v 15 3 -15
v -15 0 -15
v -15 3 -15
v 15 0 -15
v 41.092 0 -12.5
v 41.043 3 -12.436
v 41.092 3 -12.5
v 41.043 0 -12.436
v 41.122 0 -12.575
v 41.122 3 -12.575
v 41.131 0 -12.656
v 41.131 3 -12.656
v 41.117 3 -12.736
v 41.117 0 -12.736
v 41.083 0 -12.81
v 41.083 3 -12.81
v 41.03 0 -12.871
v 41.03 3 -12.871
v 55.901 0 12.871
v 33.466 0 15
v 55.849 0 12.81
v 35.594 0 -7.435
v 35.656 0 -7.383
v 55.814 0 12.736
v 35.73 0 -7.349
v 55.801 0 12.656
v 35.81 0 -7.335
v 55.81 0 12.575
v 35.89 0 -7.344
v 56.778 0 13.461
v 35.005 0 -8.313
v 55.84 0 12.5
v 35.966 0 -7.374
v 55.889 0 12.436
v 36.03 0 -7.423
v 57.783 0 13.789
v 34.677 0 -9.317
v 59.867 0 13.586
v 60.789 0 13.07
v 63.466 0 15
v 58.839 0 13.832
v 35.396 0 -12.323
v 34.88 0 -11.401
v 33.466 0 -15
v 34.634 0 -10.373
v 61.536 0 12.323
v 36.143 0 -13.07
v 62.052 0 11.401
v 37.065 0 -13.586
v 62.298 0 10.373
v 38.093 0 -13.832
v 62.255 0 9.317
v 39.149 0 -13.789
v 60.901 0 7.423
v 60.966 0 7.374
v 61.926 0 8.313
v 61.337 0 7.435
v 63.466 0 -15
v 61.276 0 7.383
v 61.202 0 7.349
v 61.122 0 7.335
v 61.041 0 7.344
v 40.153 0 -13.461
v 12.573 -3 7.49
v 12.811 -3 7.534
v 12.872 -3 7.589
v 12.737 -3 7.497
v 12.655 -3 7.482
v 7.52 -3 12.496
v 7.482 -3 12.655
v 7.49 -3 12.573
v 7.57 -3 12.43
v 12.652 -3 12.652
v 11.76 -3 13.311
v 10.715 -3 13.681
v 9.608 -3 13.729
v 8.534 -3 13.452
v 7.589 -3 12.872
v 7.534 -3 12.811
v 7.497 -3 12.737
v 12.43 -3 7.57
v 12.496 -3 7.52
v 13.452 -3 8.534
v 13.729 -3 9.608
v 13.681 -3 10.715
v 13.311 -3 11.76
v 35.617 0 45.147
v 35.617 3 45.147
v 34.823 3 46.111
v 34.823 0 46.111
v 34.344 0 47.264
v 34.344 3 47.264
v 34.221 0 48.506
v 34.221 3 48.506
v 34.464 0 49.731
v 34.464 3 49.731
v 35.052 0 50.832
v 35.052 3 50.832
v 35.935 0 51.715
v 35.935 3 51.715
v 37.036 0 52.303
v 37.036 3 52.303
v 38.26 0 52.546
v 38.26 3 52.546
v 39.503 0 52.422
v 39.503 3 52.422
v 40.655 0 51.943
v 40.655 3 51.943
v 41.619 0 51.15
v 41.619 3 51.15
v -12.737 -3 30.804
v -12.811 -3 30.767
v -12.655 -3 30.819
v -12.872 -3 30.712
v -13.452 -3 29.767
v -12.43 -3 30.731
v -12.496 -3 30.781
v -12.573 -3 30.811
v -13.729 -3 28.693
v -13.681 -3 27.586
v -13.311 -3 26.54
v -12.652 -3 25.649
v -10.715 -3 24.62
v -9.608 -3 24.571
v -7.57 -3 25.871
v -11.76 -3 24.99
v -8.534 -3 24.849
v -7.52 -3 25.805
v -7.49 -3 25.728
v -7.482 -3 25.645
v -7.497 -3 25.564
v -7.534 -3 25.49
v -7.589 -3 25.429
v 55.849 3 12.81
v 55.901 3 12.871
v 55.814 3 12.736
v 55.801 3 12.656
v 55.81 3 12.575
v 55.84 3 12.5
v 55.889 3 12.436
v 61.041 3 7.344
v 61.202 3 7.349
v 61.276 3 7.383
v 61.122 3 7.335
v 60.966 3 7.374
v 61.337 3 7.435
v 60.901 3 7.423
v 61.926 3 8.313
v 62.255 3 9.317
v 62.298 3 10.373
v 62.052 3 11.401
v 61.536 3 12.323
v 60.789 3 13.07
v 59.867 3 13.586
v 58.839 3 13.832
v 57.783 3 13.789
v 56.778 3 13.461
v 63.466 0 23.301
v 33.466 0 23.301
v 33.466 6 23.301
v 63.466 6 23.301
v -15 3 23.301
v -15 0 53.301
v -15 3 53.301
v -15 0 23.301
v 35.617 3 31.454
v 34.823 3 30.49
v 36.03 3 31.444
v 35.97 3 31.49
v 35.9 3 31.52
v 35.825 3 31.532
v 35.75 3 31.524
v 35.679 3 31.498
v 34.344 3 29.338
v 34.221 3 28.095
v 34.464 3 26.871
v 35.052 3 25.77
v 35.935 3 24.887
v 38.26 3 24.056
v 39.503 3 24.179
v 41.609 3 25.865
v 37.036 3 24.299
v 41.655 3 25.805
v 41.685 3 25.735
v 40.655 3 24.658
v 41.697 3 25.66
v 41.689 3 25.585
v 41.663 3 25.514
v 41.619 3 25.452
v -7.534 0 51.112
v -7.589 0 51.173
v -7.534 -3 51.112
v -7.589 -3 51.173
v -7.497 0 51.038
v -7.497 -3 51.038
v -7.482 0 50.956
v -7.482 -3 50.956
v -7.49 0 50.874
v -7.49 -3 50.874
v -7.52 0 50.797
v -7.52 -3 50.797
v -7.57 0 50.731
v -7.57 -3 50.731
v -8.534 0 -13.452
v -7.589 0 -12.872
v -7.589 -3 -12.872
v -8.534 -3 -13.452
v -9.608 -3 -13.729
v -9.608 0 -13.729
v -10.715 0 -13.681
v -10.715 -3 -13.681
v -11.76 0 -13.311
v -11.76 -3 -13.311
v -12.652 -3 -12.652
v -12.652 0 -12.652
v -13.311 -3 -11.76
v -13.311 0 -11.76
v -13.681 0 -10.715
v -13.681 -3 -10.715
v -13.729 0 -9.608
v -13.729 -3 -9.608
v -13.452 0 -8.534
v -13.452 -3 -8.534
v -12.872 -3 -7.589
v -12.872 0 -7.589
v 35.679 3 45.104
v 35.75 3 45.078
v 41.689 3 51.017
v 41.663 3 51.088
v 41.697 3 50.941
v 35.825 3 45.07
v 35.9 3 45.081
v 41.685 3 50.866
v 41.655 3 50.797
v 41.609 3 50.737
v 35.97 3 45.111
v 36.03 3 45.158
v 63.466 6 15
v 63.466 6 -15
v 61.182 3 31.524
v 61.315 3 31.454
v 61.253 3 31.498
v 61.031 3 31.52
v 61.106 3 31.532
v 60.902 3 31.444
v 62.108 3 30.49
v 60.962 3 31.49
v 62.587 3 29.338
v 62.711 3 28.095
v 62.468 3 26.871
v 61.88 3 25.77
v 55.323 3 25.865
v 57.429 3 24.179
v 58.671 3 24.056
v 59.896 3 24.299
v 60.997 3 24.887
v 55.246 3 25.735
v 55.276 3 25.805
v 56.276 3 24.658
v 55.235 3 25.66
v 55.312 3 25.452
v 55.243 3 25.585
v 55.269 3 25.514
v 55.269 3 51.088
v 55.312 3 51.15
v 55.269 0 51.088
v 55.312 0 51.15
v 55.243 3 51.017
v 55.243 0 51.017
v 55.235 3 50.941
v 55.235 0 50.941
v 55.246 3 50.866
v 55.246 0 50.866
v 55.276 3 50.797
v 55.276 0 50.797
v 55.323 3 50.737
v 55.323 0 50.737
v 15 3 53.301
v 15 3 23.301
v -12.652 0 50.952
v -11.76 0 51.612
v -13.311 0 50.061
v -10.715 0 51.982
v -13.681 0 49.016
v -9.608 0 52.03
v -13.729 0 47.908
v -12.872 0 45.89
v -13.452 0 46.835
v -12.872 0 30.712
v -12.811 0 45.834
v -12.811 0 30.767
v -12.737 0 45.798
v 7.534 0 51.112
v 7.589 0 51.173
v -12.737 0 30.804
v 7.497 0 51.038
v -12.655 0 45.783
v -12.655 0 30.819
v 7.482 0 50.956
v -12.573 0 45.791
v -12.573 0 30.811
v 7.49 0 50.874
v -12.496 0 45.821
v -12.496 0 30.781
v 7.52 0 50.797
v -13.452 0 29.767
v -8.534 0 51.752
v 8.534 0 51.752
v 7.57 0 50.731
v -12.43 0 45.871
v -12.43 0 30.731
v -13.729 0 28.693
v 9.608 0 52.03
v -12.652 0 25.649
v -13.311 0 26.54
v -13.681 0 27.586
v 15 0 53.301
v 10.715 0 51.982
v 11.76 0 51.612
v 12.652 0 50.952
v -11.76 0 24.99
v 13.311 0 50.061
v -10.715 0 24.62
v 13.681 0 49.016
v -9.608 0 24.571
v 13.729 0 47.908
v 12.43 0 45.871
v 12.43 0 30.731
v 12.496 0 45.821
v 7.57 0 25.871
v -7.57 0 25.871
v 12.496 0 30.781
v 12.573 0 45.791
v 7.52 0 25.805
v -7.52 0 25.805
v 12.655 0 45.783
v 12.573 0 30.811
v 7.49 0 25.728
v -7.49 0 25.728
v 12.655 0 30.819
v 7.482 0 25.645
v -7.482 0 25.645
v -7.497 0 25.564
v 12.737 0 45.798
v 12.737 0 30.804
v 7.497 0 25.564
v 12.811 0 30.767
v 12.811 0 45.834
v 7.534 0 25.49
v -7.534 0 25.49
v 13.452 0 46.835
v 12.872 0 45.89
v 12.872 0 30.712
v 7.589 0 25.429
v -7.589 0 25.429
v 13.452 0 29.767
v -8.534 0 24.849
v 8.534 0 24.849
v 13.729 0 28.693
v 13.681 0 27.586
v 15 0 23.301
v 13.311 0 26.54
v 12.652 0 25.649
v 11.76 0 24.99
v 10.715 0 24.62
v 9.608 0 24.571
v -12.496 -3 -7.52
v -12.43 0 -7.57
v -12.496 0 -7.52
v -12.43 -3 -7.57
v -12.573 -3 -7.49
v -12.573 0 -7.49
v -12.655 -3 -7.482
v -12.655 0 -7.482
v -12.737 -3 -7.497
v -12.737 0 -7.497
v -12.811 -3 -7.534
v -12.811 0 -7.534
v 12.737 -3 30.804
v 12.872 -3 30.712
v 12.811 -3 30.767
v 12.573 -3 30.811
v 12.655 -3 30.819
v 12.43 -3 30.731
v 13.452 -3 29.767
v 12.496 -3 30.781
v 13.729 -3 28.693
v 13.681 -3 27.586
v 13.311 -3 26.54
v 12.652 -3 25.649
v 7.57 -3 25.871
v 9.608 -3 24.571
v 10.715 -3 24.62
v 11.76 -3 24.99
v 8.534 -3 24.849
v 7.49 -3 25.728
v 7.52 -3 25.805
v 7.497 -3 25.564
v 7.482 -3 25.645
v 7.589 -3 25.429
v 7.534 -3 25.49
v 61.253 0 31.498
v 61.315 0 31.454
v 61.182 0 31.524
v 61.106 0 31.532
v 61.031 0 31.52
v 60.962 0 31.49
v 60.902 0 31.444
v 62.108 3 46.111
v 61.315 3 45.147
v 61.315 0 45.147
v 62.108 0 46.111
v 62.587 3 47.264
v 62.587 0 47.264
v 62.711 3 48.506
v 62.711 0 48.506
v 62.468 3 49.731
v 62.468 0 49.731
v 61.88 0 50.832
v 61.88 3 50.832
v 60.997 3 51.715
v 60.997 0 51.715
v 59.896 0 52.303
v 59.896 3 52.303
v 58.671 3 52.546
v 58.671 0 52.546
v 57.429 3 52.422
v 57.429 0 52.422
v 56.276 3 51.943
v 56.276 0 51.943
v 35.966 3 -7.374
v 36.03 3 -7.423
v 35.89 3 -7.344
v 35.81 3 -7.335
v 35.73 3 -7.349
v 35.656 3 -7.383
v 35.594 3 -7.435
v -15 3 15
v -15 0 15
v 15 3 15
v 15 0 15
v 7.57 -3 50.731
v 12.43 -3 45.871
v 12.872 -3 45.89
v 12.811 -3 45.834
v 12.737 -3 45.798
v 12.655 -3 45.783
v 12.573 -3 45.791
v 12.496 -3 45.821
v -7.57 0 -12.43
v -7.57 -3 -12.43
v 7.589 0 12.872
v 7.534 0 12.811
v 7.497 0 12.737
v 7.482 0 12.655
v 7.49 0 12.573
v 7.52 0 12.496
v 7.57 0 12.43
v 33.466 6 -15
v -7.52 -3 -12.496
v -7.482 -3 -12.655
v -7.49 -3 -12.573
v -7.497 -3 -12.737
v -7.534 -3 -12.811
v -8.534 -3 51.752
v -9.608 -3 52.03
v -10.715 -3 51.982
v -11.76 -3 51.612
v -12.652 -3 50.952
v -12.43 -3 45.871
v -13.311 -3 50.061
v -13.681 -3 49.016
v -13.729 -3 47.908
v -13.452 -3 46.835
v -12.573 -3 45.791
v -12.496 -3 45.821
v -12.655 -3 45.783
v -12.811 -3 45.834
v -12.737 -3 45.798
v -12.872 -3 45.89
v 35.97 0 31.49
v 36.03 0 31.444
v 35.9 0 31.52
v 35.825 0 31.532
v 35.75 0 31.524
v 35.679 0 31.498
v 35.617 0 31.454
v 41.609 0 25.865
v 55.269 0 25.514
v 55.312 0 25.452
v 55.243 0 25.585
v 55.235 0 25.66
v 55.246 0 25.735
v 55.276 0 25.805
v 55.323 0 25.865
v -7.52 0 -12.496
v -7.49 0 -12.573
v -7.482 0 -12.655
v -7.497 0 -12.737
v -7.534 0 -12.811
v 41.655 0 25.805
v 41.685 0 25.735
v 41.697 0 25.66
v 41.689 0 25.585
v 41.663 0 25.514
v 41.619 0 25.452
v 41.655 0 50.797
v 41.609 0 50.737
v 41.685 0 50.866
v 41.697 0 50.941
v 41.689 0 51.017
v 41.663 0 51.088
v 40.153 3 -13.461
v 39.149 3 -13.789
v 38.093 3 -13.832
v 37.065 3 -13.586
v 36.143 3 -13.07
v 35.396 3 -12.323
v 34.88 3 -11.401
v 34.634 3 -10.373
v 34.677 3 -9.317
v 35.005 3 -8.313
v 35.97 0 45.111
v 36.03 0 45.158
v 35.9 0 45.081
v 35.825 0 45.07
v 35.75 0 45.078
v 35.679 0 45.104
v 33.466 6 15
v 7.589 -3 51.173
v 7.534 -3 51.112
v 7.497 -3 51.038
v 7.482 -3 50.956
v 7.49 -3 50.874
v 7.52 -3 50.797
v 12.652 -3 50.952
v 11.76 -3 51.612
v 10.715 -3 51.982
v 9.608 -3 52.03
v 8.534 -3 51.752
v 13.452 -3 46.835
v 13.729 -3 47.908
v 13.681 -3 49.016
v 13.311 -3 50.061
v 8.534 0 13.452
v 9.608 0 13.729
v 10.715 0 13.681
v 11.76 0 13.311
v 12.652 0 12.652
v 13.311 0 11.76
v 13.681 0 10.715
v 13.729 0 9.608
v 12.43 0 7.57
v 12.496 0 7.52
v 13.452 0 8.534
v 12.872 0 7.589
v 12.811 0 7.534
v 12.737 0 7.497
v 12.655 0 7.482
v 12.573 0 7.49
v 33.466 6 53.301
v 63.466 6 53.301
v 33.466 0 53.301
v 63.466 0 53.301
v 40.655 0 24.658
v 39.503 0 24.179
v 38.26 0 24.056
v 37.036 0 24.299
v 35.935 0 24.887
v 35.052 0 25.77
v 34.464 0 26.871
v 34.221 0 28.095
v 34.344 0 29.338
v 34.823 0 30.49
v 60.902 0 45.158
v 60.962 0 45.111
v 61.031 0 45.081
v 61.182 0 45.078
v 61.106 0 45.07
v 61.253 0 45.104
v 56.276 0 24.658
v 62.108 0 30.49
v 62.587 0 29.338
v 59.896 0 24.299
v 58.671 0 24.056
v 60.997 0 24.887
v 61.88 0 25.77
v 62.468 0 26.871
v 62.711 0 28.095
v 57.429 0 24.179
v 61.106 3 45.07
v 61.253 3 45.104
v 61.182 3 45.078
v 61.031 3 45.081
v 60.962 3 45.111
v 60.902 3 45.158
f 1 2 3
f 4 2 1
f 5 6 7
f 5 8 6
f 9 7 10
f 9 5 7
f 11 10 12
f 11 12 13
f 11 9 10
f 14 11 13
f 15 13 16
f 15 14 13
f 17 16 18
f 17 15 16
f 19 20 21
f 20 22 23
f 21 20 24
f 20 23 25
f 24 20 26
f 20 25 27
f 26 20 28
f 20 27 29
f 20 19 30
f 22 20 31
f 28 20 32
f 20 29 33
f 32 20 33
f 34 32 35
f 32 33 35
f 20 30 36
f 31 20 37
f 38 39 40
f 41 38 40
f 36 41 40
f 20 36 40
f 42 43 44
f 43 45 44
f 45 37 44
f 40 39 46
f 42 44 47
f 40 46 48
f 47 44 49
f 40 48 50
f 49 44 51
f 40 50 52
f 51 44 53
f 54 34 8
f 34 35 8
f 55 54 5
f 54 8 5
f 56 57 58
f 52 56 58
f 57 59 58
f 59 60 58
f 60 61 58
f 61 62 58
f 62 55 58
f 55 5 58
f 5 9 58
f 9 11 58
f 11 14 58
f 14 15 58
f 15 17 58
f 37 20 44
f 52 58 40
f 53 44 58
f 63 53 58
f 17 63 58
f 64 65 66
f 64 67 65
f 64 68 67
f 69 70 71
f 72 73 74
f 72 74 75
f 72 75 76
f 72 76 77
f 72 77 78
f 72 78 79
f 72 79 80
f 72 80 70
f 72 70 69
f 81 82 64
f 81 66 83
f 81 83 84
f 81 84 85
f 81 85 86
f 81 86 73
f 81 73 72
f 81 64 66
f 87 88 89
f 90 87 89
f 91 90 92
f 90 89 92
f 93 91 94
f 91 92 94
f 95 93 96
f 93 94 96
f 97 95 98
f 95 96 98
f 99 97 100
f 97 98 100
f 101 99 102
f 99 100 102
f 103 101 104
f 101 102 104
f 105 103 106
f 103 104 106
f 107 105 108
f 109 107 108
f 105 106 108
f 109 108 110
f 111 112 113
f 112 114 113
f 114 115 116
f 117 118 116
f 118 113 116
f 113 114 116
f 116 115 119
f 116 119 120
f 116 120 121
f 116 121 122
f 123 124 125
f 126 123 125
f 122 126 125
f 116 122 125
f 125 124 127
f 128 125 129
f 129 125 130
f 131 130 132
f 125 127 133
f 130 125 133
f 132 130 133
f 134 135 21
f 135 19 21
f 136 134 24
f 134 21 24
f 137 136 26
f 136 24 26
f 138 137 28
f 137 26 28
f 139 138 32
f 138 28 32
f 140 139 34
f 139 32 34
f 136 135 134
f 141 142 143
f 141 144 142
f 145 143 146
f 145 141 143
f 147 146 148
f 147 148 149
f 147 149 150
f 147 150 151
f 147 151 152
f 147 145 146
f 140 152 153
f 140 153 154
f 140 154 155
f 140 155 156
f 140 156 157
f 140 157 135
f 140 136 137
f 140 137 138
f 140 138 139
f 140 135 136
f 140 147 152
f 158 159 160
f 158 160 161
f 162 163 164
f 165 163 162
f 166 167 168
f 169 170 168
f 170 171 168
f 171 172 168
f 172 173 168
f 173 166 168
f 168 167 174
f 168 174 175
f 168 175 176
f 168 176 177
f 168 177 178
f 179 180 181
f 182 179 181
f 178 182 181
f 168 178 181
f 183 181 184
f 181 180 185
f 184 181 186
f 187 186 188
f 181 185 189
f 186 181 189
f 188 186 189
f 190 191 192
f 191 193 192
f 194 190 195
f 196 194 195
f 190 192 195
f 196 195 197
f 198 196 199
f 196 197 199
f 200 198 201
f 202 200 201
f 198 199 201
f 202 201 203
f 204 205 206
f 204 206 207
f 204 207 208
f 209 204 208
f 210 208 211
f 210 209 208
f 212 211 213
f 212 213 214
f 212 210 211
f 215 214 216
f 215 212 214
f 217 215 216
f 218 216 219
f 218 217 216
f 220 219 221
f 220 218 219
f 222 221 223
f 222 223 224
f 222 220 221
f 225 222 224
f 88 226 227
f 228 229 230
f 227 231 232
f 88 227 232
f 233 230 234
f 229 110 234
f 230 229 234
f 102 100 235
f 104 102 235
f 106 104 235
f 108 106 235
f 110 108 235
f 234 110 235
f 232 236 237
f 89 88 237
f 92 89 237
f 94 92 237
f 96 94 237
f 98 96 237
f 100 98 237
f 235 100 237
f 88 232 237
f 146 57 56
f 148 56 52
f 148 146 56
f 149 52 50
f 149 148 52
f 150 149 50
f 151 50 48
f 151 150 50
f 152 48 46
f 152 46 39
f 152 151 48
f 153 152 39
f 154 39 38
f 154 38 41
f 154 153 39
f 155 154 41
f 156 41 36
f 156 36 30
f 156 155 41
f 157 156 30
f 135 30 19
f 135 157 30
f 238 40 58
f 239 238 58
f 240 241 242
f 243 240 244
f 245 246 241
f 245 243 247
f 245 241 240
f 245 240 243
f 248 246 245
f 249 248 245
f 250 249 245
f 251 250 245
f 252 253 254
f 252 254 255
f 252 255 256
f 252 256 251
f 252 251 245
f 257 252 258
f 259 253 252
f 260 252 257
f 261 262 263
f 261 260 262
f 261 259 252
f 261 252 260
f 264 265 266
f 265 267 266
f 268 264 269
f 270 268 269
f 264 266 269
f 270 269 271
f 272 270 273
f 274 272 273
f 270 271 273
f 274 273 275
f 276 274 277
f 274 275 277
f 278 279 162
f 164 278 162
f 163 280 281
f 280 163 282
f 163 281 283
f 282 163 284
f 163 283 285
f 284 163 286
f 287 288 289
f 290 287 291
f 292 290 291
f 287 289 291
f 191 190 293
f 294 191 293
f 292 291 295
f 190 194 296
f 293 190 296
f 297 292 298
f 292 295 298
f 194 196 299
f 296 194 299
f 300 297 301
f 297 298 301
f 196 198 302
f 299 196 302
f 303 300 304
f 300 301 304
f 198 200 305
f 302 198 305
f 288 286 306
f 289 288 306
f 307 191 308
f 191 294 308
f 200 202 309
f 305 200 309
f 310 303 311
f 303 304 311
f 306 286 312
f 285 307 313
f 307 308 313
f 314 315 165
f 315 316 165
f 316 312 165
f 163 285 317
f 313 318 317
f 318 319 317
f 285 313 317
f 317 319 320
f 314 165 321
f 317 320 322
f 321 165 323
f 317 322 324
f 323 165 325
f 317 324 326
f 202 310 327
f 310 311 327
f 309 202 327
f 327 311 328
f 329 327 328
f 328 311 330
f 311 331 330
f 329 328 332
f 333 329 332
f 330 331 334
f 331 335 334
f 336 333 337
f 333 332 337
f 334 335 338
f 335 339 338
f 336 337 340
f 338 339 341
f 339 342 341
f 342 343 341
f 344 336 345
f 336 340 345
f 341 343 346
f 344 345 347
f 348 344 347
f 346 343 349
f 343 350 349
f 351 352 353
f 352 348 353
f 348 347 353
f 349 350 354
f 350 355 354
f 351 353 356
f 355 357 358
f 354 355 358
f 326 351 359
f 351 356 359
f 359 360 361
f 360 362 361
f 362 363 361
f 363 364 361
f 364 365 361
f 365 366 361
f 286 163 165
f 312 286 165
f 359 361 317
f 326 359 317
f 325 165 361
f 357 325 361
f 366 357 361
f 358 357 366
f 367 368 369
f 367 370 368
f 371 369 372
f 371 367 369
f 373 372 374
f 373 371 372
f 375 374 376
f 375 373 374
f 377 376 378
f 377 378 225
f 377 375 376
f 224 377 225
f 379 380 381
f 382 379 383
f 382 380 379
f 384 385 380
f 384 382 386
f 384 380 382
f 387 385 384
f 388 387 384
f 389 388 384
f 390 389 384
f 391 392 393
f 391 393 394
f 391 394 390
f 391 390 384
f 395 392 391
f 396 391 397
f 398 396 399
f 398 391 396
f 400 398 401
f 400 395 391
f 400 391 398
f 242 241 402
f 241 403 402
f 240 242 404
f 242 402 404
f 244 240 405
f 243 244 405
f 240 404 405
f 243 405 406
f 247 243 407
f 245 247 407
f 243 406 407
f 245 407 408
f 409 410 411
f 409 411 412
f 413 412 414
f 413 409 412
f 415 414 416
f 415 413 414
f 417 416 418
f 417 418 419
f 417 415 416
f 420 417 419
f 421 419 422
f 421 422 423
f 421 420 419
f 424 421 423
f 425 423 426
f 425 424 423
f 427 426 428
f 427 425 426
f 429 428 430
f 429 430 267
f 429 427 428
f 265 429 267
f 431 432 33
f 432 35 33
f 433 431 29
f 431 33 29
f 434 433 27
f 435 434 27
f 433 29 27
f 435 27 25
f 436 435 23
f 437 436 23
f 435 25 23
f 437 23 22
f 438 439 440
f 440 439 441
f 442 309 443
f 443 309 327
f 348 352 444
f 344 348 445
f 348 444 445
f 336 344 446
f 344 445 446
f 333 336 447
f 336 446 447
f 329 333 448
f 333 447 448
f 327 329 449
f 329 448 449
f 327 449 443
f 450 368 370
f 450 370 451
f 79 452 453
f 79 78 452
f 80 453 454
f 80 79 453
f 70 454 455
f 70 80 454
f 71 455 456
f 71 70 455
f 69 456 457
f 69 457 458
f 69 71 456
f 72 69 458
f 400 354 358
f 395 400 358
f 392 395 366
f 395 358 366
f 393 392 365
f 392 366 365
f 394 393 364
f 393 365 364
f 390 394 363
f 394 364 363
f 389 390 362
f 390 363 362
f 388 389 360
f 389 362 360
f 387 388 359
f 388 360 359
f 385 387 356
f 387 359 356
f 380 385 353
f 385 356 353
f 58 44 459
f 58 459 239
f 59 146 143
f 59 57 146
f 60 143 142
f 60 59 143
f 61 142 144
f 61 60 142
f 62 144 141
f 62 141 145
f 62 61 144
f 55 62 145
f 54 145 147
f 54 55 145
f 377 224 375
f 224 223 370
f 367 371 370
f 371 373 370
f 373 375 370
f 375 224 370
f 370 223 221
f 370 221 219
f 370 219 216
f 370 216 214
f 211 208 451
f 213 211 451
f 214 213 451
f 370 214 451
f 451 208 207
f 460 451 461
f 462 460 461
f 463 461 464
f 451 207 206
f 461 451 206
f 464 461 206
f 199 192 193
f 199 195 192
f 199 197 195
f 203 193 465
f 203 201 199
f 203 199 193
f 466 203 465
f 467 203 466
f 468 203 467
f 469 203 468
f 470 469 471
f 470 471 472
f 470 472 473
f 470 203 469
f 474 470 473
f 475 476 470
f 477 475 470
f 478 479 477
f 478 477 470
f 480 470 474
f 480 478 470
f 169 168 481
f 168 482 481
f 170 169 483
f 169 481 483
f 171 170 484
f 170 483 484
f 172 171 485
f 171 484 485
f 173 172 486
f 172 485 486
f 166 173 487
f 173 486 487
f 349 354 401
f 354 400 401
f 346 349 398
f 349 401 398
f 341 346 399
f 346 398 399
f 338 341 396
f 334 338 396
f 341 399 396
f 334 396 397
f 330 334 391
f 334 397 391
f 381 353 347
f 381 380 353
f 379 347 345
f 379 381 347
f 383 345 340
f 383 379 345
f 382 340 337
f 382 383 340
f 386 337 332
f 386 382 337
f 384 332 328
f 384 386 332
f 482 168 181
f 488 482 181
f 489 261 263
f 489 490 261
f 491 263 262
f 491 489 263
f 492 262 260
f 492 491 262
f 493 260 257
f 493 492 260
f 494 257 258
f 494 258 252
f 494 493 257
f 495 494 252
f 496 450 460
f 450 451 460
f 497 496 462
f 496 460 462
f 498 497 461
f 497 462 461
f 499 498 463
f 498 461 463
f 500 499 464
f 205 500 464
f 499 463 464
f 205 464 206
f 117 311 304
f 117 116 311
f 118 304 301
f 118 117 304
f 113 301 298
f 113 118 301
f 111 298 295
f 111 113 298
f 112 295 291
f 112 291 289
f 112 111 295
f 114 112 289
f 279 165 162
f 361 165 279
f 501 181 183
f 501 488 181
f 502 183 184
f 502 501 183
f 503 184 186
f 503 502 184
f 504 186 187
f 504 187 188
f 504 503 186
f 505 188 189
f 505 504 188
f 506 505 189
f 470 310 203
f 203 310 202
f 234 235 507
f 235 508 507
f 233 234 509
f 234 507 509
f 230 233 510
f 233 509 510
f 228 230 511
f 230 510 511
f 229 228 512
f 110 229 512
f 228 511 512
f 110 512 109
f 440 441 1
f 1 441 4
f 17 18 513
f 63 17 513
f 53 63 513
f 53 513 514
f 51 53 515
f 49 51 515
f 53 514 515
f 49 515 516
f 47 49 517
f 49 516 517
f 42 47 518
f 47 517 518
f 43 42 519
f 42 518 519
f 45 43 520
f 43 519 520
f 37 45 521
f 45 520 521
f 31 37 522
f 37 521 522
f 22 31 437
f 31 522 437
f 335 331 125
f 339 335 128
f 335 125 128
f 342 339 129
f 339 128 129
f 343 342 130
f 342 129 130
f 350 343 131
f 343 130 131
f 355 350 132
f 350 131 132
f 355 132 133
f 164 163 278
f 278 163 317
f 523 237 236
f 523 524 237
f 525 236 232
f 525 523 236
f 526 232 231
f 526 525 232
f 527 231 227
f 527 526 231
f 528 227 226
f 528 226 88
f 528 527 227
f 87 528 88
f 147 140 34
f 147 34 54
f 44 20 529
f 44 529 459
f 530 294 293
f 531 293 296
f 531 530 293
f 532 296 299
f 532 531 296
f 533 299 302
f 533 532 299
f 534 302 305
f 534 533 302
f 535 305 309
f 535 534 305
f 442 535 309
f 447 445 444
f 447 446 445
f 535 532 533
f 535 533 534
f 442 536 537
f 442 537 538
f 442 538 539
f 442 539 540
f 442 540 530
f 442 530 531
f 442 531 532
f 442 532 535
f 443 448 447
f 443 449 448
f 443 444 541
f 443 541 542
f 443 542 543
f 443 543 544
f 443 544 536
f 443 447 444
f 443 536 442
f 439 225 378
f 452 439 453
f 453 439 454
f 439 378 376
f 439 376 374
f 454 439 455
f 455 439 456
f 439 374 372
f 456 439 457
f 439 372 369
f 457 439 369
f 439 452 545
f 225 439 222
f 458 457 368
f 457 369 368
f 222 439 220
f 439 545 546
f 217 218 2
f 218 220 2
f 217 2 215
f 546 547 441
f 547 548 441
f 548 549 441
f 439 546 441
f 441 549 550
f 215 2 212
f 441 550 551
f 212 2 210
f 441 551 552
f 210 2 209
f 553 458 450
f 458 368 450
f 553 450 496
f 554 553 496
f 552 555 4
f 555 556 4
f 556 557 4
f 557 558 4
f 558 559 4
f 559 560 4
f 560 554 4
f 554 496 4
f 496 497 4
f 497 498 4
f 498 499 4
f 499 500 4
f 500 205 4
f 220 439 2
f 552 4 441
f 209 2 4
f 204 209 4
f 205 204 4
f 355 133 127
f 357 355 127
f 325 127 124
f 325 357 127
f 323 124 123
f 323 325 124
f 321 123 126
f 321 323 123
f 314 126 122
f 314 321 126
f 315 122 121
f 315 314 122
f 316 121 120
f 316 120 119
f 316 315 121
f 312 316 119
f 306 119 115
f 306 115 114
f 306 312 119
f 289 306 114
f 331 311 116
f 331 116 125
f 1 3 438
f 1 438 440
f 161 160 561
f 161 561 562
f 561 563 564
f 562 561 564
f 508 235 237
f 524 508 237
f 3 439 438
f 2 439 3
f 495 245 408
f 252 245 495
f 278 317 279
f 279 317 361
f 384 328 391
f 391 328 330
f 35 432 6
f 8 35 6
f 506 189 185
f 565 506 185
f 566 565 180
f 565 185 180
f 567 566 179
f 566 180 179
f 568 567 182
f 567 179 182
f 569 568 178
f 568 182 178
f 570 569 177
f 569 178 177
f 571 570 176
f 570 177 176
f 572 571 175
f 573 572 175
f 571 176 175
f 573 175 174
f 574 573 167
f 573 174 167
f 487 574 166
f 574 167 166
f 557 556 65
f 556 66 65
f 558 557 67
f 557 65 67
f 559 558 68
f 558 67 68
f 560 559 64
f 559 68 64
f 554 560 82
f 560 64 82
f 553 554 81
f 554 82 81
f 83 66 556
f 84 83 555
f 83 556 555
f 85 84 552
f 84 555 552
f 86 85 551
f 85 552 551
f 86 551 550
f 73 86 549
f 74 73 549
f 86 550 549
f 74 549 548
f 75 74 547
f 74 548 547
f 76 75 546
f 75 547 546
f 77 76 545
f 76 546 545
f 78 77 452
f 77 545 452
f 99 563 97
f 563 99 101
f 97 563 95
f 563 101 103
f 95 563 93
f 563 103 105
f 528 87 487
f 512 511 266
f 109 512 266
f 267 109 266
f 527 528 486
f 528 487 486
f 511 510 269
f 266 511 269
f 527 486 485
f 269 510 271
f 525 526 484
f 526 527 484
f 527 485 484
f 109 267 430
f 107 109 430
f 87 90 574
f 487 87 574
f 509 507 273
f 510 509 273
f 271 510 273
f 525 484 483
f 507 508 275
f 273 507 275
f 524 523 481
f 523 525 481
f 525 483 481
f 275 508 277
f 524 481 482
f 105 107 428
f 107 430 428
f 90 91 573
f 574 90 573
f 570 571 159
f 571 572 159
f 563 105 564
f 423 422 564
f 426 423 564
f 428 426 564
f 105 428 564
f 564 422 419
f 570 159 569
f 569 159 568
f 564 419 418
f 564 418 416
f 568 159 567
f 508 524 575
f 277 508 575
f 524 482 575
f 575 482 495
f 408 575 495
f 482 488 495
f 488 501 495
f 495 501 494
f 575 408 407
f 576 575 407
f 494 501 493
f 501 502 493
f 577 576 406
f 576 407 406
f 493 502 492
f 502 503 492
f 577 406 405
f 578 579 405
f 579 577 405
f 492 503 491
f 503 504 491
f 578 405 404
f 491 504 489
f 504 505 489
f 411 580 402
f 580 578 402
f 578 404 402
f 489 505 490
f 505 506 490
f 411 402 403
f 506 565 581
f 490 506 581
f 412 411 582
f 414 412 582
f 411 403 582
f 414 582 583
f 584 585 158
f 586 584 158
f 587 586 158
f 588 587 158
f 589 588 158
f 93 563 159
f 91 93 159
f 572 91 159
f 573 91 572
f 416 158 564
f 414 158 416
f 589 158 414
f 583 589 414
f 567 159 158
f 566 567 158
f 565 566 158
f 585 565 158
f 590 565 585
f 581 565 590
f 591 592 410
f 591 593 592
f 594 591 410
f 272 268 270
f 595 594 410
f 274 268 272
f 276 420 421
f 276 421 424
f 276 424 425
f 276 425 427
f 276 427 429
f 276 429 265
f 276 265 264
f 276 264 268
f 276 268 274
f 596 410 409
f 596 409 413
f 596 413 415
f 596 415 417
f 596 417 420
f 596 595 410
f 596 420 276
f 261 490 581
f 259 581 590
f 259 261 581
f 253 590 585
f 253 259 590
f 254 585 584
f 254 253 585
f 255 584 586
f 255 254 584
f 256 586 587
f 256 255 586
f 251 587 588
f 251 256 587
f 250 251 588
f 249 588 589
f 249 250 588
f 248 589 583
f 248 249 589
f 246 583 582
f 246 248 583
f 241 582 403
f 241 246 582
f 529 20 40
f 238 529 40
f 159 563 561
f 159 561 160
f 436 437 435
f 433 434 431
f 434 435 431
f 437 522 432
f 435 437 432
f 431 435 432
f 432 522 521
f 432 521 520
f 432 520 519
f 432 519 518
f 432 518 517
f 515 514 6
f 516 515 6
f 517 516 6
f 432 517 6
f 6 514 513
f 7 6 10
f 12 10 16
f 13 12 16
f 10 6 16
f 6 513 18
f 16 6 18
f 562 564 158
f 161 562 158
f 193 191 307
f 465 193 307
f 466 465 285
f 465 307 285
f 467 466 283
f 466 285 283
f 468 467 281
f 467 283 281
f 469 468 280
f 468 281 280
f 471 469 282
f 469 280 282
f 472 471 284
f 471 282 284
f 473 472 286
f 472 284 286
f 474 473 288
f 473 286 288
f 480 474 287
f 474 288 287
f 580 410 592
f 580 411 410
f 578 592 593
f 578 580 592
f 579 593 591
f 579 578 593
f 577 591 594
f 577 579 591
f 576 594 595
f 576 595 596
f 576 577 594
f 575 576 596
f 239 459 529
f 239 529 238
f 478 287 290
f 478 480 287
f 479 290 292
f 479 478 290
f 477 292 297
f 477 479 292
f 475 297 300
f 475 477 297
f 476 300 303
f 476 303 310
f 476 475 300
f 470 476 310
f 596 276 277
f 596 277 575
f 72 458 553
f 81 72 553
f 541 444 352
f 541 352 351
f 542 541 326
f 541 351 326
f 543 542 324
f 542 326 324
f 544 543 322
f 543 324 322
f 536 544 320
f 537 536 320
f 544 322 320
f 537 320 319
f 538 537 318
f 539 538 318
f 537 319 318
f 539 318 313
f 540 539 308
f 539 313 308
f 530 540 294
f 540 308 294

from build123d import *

# Parameters (mm, degrees)
SKETCH3_W           = 30
SKETCH3_H           = 30
BOSS_EXTRUDE1_DEPTH = 3
BOSS_EXTRUDE2_DEPTH = 6
SKETCH5_W           = 30
SKETCH5_H           = 30
BOSS_EXTRUDE4_DEPTH = 6
FILLET3_R           = 0.3
CUT_EXTRUDE2_START  = -3
CUT_EXTRUDE2_DEPTH  = 3
SKETCH17_W          = 30
SKETCH17_H          = 30
BOSS_EXTRUDE6_DEPTH = 3
BOSS_EXTRUDE7_DEPTH = 6
SKETCH20_W          = 30
SKETCH20_H          = 30
BOSS_EXTRUDE8_DEPTH = 6
CUT_EXTRUDE3_START  = -3
CUT_EXTRUDE3_DEPTH  = 3
FILLET4_R           = 0.3
FILLET5_R           = 0.3
FILLET6_R           = 0.3


with BuildPart() as part:
    # Sketch3 → Boss-Extrude1 (new body)
    with BuildSketch(Plane(origin=(0, 0, 0), x_dir=(1, 0, 0), z_dir=(0, 1, 0))):
        Rectangle(SKETCH3_W, SKETCH3_H)
    extrude(amount=BOSS_EXTRUDE1_DEPTH)

    # Sketch1 → Boss-Extrude2 (add)
    with BuildSketch(Plane(origin=(0, 3, 0), x_dir=(1, 0, 0), z_dir=(0, 1, 0))):
        with BuildLine():
            Line((-12.651650429, 7.348349571), (-7.348349571, 12.651650429))
            ThreePointArc((-7.348349571, 12.651650429), (-12.651650429, 12.651650429), (-12.651650429, 7.348349571))
        make_face()
        with BuildLine():
            Line((7.348349571, -12.651650429), (12.651650429, -7.348349571))
            ThreePointArc((12.651650429, -7.348349571), (12.651650429, -12.651650429), (7.348349571, -12.651650429))
        make_face()
    extrude(amount=-BOSS_EXTRUDE2_DEPTH)

    # Fillet3
    fillet3_edges = [part.edges().sort_by_distance(p)[0] for p in [
        (-12.651650429, -1.5, -7.348349571),
        (-7.348349571, -1.5, -12.651650429),
        (12.651650429, -1.5, 7.348349571),
        (7.348349571, -1.5, 12.651650429),
    ]]
    fillet(fillet3_edges, radius=FILLET3_R)


with BuildPart() as body_2:
    # Sketch5 → Boss-Extrude4 (new body)
    with BuildSketch(Plane(origin=(0, 0, 0), x_dir=(1, 0, 0), z_dir=(0, 1, 0))):
        with Locations((48.465823931, 0)):
            Rectangle(SKETCH5_W, SKETCH5_H)
    extrude(amount=BOSS_EXTRUDE4_DEPTH)

    # Sketch16 → Cut-Extrude2 (cut)
    with BuildSketch(Plane(origin=(0, 6, 0), x_dir=(1, 0, 0), z_dir=(0, 1, 0)).offset(CUT_EXTRUDE2_START)):
        with BuildLine():
            Line((35.815091977, 7.20784669), (41.257977241, 12.650731954))
            ThreePointArc((41.257977241, 12.650731954), (35.743462823, 12.722361108), (35.815091977, 7.20784669))
        make_face()
        with BuildLine():
            Line((55.67367062, -12.650731954), (61.116555885, -7.20784669))
            ThreePointArc((61.116555885, -7.20784669), (61.188185038, -12.722361108), (55.67367062, -12.650731954))
        make_face()
    extrude(amount=-CUT_EXTRUDE2_DEPTH, mode=Mode.SUBTRACT)

    # Fillet4
    fillet4_edges = [body_2.edges().sort_by_distance(p)[0] for p in [
        (35.815091977, 1.5, -7.20784669),
        (41.257977241, 1.5, -12.650731954),
        (61.116555885, 1.5, 7.20784669),
        (55.67367062, 1.5, 12.650731954),
    ]]
    fillet(fillet4_edges, radius=FILLET4_R)


with BuildPart() as body_3:
    # Sketch17 → Boss-Extrude6 (new body)
    with BuildSketch(Plane(origin=(0, 0, 0), x_dir=(1, 0, 0), z_dir=(0, 1, 0))):
        with Locations((0, -38.300792551)):
            Rectangle(SKETCH17_W, SKETCH17_H)
    extrude(amount=BOSS_EXTRUDE6_DEPTH)

    # Sketch19 → Boss-Extrude7 (add)
    with BuildSketch(Plane(origin=(0, 3, 0), x_dir=(1, 0, 0), z_dir=(0, 1, 0))):
        with BuildLine():
            Line((12.651650429, -30.952442981), (7.348349571, -25.649142122))
            ThreePointArc((7.348349571, -25.649142122), (12.651650429, -25.649142122), (12.651650429, -30.952442981))
        make_face()
        with BuildLine():
            Line((7.348349571, -50.952442981), (12.651650429, -45.649142122))
            ThreePointArc((12.651650429, -45.649142122), (12.651650429, -50.952442981), (7.348349571, -50.952442981))
        make_face()
        with BuildLine():
            ThreePointArc((-7.348349571, -50.952442981), (-12.651650429, -50.952442981), (-12.651650429, -45.649142122))
            Line((-12.651650429, -45.649142122), (-7.348349571, -50.952442981))
        make_face()
        with BuildLine():
            Line((-12.651650429, -30.952442981), (-7.348349571, -25.649142122))
            ThreePointArc((-7.348349571, -25.649142122), (-12.651650429, -25.649142122), (-12.651650429, -30.952442981))
        make_face()
    extrude(amount=-BOSS_EXTRUDE7_DEPTH)

    # Fillet5
    fillet5_edges = [body_3.edges().sort_by_distance(p)[0] for p in [
        (12.651650429, -1.5, 30.952442981),
        (7.348349571, -1.5, 25.649142122),
        (7.348349571, -1.5, 50.952442981),
        (12.651650429, -1.5, 45.649142122),
        (-7.348349571, -1.5, 50.952442981),
        (-12.651650429, -1.5, 45.649142122),
        (-7.348349571, -1.5, 25.649142122),
        (-12.651650429, -1.5, 30.952442981),
    ]]
    fillet(fillet5_edges, radius=FILLET5_R)


with BuildPart() as body_4:
    # Sketch20 → Boss-Extrude8 (new body)
    with BuildSketch(Plane(origin=(0, 0, 0), x_dir=(1, 0, 0), z_dir=(0, 1, 0))):
        with Locations((48.465823931, -38.300792551)):
            Rectangle(SKETCH20_W, SKETCH20_H)
    extrude(amount=BOSS_EXTRUDE8_DEPTH)

    # Sketch21 → Cut-Extrude3 (cut)
    with BuildSketch(Plane(origin=(0, 6, 0), x_dir=(1, 0, 0), z_dir=(0, 1, 0)).offset(CUT_EXTRUDE3_START)):
        with BuildLine():
            Line((55.127936444, -50.931573257), (61.096604637, -44.962905064))
            ThreePointArc((61.096604637, -44.962905064), (61.471027751, -51.305996371), (55.127936444, -50.931573257))
        make_face()
        with BuildLine():
            Line((61.096604637, -31.638680038), (55.127936444, -25.670011845))
            ThreePointArc((55.127936444, -25.670011845), (61.471027751, -25.295588731), (61.096604637, -31.638680038))
        make_face()
        with BuildLine():
            Line((41.803711418, -50.931573257), (35.835043225, -44.962905064))
            ThreePointArc((35.835043225, -44.962905064), (35.460620111, -51.305996371), (41.803711418, -50.931573257))
        make_face()
        with BuildLine():
            Line((35.835043225, -31.638680038), (41.803711418, -25.670011845))
            ThreePointArc((41.803711418, -25.670011845), (35.460620111, -25.295588731), (35.835043225, -31.638680038))
        make_face()
    extrude(amount=-CUT_EXTRUDE3_DEPTH, mode=Mode.SUBTRACT)

    # Fillet6
    fillet6_edges = [body_4.edges().sort_by_distance(p)[0] for p in [
        (35.835043225, 1.5, 31.638680038),
        (41.803711418, 1.5, 25.670011845),
        (41.803711418, 1.5, 50.931573257),
        (35.835043225, 1.5, 44.962905064),
        (55.127936444, 1.5, 50.931573257),
        (61.096604637, 1.5, 44.962905064),
        (55.127936444, 1.5, 25.670011845),
        (61.096604637, 1.5, 31.638680038),
    ]]
    fillet(fillet6_edges, radius=FILLET6_R)


solid = Compound([part.part, body_2.part, body_3.part, body_4.part])
